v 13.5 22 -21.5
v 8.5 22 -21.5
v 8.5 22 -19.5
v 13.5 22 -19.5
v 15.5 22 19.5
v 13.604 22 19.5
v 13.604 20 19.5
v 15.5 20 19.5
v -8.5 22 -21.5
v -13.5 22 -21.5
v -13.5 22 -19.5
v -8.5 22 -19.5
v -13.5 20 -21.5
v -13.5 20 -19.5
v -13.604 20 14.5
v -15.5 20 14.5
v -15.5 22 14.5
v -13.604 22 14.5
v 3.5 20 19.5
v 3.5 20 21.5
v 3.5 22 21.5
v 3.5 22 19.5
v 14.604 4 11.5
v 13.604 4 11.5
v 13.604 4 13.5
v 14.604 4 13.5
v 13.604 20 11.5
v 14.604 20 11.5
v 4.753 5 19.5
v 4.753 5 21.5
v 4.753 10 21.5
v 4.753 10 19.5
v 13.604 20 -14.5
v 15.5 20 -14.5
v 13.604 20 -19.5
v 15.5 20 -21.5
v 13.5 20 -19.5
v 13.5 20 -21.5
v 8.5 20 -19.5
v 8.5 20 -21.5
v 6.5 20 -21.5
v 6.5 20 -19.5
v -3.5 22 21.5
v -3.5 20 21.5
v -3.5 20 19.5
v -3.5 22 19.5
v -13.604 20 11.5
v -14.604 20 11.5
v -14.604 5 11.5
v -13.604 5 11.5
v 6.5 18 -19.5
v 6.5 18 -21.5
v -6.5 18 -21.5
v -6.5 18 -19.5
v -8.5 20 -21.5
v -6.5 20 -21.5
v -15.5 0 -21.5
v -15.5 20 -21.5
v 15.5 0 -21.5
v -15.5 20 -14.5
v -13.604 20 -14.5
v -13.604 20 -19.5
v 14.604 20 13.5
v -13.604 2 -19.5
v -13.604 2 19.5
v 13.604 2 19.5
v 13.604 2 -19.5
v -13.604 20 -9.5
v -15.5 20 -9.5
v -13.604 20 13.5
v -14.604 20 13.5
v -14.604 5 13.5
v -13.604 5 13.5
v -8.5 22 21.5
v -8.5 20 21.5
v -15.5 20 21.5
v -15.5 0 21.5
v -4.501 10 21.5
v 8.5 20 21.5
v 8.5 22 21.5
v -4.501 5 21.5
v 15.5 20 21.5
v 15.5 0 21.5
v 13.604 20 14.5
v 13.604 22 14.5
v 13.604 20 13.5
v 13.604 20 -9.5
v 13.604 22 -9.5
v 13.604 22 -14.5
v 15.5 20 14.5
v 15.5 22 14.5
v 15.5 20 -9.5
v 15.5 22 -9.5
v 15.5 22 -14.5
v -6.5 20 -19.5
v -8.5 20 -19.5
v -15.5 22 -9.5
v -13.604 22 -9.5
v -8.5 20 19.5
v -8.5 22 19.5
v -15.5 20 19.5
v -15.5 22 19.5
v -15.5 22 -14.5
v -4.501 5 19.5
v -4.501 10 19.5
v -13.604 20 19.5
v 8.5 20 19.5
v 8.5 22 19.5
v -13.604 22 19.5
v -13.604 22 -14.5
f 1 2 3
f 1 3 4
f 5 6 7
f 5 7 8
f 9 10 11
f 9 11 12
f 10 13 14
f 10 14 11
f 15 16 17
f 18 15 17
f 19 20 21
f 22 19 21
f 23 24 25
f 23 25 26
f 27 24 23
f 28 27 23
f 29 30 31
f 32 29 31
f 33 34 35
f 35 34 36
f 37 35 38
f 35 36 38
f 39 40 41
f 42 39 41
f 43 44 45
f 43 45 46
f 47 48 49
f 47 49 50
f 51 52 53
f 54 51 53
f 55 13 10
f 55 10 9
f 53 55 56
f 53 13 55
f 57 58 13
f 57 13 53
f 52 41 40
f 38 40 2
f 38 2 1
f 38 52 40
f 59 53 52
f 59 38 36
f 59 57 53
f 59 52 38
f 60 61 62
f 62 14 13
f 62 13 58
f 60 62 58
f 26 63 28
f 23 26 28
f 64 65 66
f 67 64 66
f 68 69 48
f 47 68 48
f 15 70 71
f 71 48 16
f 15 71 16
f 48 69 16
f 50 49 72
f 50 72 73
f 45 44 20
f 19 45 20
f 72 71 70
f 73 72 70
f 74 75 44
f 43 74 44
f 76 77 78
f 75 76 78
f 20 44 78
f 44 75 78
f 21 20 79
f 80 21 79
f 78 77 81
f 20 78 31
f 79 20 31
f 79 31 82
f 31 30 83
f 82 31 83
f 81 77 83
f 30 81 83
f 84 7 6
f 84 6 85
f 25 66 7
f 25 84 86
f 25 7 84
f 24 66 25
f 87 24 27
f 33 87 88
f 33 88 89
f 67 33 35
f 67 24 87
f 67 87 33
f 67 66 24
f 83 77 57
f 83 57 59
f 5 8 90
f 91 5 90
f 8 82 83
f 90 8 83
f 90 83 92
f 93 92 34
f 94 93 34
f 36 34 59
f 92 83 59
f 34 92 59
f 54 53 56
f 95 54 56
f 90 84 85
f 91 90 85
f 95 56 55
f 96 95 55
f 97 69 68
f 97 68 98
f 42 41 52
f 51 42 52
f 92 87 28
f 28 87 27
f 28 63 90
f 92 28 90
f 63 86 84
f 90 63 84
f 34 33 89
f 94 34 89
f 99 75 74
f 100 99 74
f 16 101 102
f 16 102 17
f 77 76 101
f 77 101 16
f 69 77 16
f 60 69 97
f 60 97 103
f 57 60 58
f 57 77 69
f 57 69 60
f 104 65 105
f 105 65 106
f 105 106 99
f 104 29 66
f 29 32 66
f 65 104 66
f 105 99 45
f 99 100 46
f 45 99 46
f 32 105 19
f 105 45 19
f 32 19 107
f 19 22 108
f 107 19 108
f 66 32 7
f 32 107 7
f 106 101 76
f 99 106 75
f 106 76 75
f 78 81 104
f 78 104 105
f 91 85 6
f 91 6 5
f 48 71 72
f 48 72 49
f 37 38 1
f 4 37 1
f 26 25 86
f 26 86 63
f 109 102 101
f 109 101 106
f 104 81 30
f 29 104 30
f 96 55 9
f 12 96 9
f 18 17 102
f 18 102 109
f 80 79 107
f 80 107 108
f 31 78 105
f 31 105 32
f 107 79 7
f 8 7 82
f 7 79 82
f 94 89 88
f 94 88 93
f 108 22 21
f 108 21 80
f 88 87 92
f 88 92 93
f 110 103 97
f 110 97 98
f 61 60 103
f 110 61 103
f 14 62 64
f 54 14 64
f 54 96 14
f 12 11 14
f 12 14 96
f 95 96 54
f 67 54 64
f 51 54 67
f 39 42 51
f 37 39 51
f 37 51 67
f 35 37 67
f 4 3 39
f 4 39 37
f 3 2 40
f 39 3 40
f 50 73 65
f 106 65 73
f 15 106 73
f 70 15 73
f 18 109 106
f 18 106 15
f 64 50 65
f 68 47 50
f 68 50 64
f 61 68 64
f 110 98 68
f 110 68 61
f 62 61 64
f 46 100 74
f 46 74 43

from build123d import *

# Parameters (mm, degrees)
SKETCH1_W           = 31
SKETCH1_H           = 43
BOSS_EXTRUDE1_DEPTH = 22
SKETCH2_W           = 27.20800305
SKETCH2_H           = 39
CUT_EXTRUDE1_DEPTH  = 20
SKETCH3_W           = 9.254141904
SKETCH3_H           = 5
CUT_EXTRUDE2_DEPTH  = 20
SKETCH4_W           = 7
SKETCH4_H           = 2
CUT_EXTRUDE3_DEPTH  = 2
SKETCH5_W           = 2
SKETCH5_H           = 2
CUT_EXTRUDE6_DEPTH  = 2
SKETCH6_W           = 5
SKETCH6_H           = 2
SKETCH6_W_2         = 19
CUT_EXTRUDE10_DEPTH = 34
SKETCH10_W          = 1
SKETCH10_H          = 2
CUT_EXTRUDE11_DEPTH = 18
SKETCH11_W          = 1
SKETCH11_H          = 2
CUT_EXTRUDE12_DEPTH = 15
SKETCH12_W          = 1
SKETCH12_H          = 2
BOSS_EXTRUDE3_DEPTH = 2


with BuildPart() as part:
    # Sketch1 → Boss-Extrude1 (new body)
    with BuildSketch(Plane(origin=(0, 0, 0), x_dir=(1, 0, 0), z_dir=(0, 1, 0))):
        Rectangle(SKETCH1_W, SKETCH1_H)
    extrude(amount=BOSS_EXTRUDE1_DEPTH)

    # Sketch2 → Cut-Extrude1 (cut)
    with BuildSketch(Plane(origin=(0, 22, 0), x_dir=(1, 0, 0), z_dir=(0, 1, 0))):
        Rectangle(SKETCH2_W, SKETCH2_H)
    extrude(amount=-CUT_EXTRUDE1_DEPTH, mode=Mode.SUBTRACT)

    # Sketch3 → Cut-Extrude2 (cut)
    with BuildSketch(Plane.XY.offset(21.5)):
        with Locations((0.126254012, 7.5)):
            Rectangle(SKETCH3_W, SKETCH3_H)
    extrude(amount=-CUT_EXTRUDE2_DEPTH, mode=Mode.SUBTRACT)

    # Sketch4 → Cut-Extrude3 (cut)
    with BuildSketch(Plane.XY.offset(21.5)):
        with Locations((-12, 21)):
            Rectangle(SKETCH4_W, SKETCH4_H)
        with Locations((0, 21)):
            Rectangle(SKETCH4_W, SKETCH4_H)
        with Locations((12, 21)):
            Rectangle(SKETCH4_W, SKETCH4_H)
    extrude(amount=-CUT_EXTRUDE3_DEPTH, mode=Mode.SUBTRACT)

    # Sketch5 → Cut-Extrude6 (cut)
    with BuildSketch(Plane(origin=(0, 0, -21.5), x_dir=(-1, 0, 0), z_dir=(0, 0, -1))):
        with Locations((14.5, 21)):
            Rectangle(SKETCH5_W, SKETCH5_H)
        Polygon((-8.5, 22), (-8.5, 20), (-6.500281768, 20), (6.499718232, 20), (8.5, 20), (8.5, 22), align=None)
        with Locations((-14.5, 21)):
            Rectangle(SKETCH5_W, SKETCH5_H)
        Polygon((6.499718232, 20), (-6.500281768, 20), (-6.500281768, 19.64343591), (-6.500281768, 18), (6.499718232, 18), align=None)
    extrude(amount=-CUT_EXTRUDE6_DEPTH, mode=Mode.SUBTRACT)

    # Sketch6 → Cut-Extrude10 (cut)
    with BuildSketch(Plane.ZY.offset(15.5)):
        with Locations((-17, 21)):
            Rectangle(SKETCH6_W, SKETCH6_H)
        with Locations((0, 21)):
            Rectangle(SKETCH6_W_2, SKETCH6_H)
        with Locations((12, 21)):
            Rectangle(SKETCH6_W, SKETCH6_H)
    extrude(amount=-CUT_EXTRUDE10_DEPTH, mode=Mode.SUBTRACT)

    # Sketch10 → Cut-Extrude11 (cut)
    with BuildSketch(Plane(origin=(0, 2, 0), x_dir=(1, 0, 0), z_dir=(0, 1, 0))):
        with Locations((14.104001525, -12.5)):
            Rectangle(SKETCH10_W, SKETCH10_H)
    extrude(amount=CUT_EXTRUDE11_DEPTH, mode=Mode.SUBTRACT)

    # Sketch11 → Cut-Extrude12 (cut)
    with BuildSketch(Plane(origin=(0, 20, 0), x_dir=(1, 0, 0), z_dir=(0, 1, 0))):
        with Locations((-14.104001525, -12.5)):
            Rectangle(SKETCH11_W, SKETCH11_H)
    extrude(amount=-CUT_EXTRUDE12_DEPTH, mode=Mode.SUBTRACT)

    # Sketch12 → Boss-Extrude3 (add)
    with BuildSketch(Plane(origin=(0, 2, 0), x_dir=(1, 0, 0), z_dir=(0, 1, 0))):
        with Locations((14.104001525, -12.5)):
            Rectangle(SKETCH12_W, SKETCH12_H)
    extrude(amount=BOSS_EXTRUDE3_DEPTH)


solid = part.part
